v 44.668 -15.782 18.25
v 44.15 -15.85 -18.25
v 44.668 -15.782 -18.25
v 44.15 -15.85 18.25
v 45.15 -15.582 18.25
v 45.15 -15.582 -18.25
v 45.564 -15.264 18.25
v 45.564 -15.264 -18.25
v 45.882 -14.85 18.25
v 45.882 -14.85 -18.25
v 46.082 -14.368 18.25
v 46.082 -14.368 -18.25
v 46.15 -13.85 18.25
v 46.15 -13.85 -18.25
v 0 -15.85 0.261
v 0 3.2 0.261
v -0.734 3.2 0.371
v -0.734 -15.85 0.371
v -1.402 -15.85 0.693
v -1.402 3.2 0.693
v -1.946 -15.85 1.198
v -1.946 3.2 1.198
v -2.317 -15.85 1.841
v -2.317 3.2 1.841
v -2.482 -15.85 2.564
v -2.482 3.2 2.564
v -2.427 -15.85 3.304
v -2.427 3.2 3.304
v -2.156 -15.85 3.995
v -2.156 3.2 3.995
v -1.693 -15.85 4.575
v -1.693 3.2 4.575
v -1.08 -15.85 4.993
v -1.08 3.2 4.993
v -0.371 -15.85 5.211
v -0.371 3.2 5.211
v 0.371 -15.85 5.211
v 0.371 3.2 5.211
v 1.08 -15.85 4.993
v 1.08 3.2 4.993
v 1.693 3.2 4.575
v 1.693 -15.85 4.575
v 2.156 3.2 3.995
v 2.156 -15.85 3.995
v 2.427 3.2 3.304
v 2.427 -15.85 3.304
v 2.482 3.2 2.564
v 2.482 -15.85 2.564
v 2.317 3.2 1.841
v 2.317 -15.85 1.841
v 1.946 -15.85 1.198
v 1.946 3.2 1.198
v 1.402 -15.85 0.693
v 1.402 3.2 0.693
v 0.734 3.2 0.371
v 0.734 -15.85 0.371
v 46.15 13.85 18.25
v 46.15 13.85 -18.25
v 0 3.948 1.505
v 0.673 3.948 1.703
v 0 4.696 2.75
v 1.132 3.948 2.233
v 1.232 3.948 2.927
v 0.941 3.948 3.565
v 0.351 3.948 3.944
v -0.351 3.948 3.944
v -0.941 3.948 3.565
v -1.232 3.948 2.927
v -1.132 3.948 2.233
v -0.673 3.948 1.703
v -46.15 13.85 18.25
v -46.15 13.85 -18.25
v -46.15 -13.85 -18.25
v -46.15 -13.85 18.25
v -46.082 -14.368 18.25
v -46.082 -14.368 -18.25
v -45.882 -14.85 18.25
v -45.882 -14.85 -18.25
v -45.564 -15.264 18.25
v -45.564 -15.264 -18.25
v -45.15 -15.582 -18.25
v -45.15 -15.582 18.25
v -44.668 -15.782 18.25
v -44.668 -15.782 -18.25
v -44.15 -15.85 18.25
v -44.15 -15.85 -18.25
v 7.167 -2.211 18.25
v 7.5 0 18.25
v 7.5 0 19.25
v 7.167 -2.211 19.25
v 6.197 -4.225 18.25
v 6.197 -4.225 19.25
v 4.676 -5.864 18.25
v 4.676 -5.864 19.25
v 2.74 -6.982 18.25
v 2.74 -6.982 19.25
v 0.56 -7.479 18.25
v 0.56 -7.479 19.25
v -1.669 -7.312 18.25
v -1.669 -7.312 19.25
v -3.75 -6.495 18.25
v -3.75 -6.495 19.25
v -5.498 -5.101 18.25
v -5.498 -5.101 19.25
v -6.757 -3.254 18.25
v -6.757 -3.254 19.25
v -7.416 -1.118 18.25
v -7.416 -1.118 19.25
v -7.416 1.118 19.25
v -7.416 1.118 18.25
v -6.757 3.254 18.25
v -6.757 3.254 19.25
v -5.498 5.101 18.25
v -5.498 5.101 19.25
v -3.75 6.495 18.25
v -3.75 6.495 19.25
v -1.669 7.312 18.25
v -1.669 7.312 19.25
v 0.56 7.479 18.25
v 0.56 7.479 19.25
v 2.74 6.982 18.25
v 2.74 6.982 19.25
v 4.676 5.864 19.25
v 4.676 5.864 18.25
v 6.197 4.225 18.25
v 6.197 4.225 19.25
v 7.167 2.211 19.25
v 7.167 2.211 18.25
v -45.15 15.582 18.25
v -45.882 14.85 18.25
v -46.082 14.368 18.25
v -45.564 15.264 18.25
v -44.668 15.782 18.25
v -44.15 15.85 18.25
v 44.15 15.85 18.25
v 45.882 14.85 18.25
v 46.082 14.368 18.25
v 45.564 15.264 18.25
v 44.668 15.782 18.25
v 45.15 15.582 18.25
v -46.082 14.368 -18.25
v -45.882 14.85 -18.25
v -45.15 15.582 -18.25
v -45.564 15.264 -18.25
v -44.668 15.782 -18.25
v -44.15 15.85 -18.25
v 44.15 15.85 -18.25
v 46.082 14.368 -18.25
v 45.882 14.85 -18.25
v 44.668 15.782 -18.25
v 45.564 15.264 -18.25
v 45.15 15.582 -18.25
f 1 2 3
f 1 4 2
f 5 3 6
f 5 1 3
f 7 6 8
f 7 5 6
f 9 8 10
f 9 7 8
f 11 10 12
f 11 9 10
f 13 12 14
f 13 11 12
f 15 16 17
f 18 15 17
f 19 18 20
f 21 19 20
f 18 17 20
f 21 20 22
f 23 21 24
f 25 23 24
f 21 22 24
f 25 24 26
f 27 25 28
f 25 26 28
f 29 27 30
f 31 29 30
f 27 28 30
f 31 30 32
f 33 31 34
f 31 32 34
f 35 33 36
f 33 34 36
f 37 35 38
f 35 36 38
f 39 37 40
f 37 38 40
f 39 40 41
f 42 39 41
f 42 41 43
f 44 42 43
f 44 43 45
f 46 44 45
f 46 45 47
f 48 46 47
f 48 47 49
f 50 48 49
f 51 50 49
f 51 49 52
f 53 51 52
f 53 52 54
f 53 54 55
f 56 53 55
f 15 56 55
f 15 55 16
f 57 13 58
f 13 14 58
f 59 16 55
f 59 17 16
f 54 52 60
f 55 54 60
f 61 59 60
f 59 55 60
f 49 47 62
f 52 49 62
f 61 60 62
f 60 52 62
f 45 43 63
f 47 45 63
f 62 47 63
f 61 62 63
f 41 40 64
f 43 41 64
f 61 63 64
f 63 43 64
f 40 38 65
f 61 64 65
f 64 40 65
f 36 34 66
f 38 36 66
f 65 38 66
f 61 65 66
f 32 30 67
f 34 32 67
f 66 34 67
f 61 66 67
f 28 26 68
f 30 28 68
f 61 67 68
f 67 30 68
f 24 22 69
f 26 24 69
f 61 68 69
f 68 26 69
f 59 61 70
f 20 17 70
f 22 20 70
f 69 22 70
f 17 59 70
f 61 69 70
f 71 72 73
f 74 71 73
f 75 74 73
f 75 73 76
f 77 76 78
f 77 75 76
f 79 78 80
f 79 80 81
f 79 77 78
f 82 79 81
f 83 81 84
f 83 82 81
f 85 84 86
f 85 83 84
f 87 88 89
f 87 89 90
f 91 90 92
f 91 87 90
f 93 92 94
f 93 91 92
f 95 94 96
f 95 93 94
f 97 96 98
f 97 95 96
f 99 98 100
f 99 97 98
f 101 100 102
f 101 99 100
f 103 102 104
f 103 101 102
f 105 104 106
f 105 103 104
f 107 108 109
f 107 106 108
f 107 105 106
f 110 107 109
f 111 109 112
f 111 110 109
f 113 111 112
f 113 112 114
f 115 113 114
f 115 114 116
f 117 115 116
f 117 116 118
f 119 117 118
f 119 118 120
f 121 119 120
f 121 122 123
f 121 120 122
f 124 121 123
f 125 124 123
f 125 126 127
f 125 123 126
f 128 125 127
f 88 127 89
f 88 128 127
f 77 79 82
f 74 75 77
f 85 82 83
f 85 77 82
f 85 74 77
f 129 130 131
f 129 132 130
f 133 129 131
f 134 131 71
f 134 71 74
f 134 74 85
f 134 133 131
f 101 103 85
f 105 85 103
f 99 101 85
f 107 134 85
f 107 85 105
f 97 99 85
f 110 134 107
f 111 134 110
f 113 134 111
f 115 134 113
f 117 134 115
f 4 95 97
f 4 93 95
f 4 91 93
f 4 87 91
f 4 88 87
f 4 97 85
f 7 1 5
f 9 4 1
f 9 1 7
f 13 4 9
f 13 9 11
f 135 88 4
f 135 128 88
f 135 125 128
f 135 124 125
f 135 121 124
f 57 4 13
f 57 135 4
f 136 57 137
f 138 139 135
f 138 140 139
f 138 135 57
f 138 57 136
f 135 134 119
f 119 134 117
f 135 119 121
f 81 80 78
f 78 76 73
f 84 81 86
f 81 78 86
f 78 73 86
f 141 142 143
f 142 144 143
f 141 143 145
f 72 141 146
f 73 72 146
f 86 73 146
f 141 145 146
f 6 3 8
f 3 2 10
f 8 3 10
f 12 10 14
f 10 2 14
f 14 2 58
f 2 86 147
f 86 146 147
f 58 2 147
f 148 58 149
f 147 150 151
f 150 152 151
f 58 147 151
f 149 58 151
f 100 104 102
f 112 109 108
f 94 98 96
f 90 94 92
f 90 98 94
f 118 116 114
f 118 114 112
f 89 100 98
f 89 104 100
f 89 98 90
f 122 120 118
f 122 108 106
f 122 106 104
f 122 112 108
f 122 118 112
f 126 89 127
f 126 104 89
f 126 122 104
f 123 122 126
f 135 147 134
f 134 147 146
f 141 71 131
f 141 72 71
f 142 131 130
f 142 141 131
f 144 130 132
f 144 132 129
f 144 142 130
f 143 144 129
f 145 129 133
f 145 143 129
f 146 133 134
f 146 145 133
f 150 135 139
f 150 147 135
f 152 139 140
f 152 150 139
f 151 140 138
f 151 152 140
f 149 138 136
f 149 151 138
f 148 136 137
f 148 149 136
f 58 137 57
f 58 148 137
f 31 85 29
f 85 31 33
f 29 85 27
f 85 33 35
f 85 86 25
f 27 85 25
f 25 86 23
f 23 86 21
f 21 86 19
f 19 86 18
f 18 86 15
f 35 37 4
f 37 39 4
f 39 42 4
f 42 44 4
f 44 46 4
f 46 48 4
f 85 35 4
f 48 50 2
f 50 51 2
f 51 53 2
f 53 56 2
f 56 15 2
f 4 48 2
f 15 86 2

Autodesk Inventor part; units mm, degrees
ref_plane "YZ Plane" through (0, 0, 0) normal (1, 0, 0) x (0, 1, 0)
ref_plane "XZ Plane" through (0, 0, 0) normal (0, 1, 0) x (-1, 0, 0)
ref_plane "XY Plane" through (0, 0, 0) normal (0, 0, 1) x (1, 0, 0)
sketch "スケッチ2" plane through (0, 0, 0) normal (0, 0, 1) x (1, 0, 0)
  line L0 (-46.15, -15.85) -> (46.15, -15.85)
  line L1 (46.15, -15.85) -> (46.15, 15.85)
  line L2 (46.15, 15.85) -> (-46.15, 15.85)
  line L3 (-46.15, 15.85) -> (-46.15, -15.85)
  line L4 (-46.15, -15.85) -> (46.15, 15.85) construction
  line L5 (46.15, -15.85) -> (-46.15, 15.85) construction
  point P0 (0, 0)
  dimension "d4" = 92.3
  dimension "d5" = 31.7
extrude "押し出し2" add sketch "スケッチ2" along normal mid plane 36.5
fillet "フィレット1" radius 2 4 edges at (46.15, 15.85, 0) (46.15, -15.85, 0) (-46.15, 15.85, 0) (-46.15, -15.85, 0)
sketch "スケッチ3" plane through (-44.15, -15.85, -18.25) normal (0, -1, 0) x (1, 0, 0)
  line L0 (-2, 36.5) -> (-2, 0) projected
  line L1 (0, 36.5) -> (88.3, 36.5) projected
  point P0 (44.15, 18.25)
  point P1 (44.15, 21)
  dimension "d9" = 46.15
  dimension "d10" = 15.5
hole "穴1" at (0, -15.85, 2.75) direction (0, 1, 0) diameter 4.9784 depth 19.05 tip angle 118 thread size "1/4-20 UNC" class "2B" standard "ANSI Unified Screw Threads"
sketch "スケッチ4" plane through (0, 0, 18.25) normal (0, 0, 1) x (1, 0, 0)
  circle A0 centre (0, 0) radius 7.5
  dimension "d18" = 15
extrude "押し出し3" add sketch "スケッチ4" along normal blind 1
properties part number "zed_x_mini"
